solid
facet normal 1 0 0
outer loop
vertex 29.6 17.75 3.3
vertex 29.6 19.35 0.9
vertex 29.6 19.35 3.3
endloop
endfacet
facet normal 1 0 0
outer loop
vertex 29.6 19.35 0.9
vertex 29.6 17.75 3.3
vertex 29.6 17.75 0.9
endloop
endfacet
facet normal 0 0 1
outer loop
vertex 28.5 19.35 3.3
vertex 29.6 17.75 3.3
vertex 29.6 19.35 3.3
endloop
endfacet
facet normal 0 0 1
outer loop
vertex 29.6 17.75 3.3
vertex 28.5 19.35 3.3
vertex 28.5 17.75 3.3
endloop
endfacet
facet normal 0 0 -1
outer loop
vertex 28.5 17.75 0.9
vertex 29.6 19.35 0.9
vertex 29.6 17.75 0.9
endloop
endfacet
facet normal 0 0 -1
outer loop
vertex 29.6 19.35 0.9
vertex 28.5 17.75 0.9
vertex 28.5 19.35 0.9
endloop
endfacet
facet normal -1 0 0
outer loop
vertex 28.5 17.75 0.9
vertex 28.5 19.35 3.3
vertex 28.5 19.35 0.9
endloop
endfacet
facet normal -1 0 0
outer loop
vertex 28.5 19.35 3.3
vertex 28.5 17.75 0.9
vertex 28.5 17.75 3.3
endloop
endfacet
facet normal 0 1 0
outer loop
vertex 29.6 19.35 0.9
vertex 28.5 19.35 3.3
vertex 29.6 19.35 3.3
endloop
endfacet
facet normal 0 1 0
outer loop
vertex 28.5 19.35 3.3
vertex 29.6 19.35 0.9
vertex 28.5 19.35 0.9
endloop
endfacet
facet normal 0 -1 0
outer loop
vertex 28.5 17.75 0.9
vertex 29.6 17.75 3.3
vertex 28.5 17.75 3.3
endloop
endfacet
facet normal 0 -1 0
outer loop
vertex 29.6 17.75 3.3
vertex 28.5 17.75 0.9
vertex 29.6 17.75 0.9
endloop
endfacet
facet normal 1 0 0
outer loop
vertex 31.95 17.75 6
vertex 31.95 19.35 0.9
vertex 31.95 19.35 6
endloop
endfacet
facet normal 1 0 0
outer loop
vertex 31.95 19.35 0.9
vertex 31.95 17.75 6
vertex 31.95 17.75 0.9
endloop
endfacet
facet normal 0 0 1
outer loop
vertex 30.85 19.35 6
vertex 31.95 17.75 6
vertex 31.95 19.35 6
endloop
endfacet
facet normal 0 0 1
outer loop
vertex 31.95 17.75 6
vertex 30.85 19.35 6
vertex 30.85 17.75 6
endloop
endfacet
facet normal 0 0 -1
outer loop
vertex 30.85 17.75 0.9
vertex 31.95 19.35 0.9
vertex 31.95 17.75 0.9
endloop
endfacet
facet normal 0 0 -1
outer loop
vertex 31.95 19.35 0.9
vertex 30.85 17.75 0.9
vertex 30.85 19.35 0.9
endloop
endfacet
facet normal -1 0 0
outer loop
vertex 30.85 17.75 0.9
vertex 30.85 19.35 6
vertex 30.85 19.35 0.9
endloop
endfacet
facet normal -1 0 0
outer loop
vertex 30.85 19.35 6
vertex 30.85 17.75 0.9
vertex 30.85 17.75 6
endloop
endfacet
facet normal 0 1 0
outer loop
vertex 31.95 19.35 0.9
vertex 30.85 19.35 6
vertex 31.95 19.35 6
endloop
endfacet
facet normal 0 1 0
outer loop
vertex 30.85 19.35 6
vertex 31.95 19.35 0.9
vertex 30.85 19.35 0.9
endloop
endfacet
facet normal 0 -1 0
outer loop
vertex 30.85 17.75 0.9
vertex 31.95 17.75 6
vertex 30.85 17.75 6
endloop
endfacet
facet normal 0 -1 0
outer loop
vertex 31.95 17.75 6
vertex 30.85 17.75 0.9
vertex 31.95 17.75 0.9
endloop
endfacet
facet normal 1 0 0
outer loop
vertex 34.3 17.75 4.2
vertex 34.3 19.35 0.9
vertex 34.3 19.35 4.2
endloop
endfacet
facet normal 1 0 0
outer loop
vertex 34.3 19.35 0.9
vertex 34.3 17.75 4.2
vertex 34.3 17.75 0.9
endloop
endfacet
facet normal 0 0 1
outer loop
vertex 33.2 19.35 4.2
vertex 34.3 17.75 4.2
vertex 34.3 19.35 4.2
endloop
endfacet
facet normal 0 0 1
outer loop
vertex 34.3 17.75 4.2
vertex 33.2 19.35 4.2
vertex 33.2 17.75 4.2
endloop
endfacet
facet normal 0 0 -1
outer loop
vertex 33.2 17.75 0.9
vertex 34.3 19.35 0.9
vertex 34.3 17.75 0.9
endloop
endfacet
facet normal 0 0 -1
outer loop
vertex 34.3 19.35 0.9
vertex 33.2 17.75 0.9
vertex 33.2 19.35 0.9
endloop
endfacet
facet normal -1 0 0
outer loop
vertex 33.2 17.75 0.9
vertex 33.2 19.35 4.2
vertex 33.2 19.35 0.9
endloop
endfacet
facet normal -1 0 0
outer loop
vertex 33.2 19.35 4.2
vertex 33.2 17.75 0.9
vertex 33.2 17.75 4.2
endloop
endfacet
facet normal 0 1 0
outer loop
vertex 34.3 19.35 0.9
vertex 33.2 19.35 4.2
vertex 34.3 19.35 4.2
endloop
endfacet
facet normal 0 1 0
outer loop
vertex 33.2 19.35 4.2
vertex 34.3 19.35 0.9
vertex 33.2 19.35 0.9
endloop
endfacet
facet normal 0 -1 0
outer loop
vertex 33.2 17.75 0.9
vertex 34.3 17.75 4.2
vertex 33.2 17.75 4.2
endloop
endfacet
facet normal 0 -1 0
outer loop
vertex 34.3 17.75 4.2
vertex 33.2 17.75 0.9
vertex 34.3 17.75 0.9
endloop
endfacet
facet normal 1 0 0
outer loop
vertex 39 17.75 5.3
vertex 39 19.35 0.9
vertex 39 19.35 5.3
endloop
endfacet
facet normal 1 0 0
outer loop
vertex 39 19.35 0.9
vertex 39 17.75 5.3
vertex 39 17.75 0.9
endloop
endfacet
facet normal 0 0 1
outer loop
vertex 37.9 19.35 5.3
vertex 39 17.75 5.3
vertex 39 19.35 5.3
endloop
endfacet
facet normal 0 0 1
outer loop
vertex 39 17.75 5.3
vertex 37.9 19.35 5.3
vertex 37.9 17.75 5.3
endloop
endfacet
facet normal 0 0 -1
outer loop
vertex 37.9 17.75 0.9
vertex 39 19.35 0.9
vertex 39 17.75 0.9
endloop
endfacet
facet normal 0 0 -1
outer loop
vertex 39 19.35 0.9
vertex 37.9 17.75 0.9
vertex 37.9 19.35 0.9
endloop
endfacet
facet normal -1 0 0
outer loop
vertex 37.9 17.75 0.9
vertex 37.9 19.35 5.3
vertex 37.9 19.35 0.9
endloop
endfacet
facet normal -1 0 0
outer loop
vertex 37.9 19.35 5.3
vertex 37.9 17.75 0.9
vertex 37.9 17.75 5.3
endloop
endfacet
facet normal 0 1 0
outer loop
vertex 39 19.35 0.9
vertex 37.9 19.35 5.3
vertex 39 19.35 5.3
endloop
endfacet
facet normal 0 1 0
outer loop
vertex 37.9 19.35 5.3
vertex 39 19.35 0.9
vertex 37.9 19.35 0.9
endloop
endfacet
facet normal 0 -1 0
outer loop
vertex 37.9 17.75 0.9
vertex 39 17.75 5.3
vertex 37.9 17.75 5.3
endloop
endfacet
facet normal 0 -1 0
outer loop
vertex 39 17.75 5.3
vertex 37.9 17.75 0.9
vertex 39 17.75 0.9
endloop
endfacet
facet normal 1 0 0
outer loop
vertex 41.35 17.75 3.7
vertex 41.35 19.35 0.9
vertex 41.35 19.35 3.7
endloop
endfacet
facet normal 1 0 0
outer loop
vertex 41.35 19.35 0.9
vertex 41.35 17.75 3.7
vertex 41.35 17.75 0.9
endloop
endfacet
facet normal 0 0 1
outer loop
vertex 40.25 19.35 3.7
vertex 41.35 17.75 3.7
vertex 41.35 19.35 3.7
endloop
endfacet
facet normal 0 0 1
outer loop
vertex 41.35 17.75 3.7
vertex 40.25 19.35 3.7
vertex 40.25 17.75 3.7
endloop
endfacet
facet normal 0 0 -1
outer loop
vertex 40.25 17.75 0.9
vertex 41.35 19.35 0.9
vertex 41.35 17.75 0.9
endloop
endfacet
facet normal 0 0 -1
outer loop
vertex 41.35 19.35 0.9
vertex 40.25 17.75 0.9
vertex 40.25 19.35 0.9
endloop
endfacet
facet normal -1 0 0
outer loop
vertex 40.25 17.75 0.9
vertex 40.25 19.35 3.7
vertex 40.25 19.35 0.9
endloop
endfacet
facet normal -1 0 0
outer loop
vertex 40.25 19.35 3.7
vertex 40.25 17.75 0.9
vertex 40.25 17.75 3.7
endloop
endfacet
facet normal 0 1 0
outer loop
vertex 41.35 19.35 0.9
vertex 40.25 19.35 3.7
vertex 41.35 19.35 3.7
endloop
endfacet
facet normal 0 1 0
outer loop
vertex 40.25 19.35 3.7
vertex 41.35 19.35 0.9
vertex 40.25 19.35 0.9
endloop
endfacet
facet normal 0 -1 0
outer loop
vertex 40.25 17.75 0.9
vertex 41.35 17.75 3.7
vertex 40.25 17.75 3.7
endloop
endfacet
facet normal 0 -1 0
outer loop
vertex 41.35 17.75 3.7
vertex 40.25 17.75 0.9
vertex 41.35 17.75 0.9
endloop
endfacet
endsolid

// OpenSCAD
union() {
  translate([28.5, 17.75, 0.9]) cube(size=[1.1,1.6,2.4], center=false);
  translate([30.85, 17.75, 0.9]) cube(size=[1.1,1.6,5.1], center=false);
  translate([33.2, 17.75, 0.9]) cube(size=[1.1,1.6,3.3], center=false);
  translate([37.9, 17.75, 0.9]) cube(size=[1.1,1.6,4.4], center=false);
  translate([40.25, 17.75, 0.9]) cube(size=[1.1,1.6,2.8], center=false);
}
